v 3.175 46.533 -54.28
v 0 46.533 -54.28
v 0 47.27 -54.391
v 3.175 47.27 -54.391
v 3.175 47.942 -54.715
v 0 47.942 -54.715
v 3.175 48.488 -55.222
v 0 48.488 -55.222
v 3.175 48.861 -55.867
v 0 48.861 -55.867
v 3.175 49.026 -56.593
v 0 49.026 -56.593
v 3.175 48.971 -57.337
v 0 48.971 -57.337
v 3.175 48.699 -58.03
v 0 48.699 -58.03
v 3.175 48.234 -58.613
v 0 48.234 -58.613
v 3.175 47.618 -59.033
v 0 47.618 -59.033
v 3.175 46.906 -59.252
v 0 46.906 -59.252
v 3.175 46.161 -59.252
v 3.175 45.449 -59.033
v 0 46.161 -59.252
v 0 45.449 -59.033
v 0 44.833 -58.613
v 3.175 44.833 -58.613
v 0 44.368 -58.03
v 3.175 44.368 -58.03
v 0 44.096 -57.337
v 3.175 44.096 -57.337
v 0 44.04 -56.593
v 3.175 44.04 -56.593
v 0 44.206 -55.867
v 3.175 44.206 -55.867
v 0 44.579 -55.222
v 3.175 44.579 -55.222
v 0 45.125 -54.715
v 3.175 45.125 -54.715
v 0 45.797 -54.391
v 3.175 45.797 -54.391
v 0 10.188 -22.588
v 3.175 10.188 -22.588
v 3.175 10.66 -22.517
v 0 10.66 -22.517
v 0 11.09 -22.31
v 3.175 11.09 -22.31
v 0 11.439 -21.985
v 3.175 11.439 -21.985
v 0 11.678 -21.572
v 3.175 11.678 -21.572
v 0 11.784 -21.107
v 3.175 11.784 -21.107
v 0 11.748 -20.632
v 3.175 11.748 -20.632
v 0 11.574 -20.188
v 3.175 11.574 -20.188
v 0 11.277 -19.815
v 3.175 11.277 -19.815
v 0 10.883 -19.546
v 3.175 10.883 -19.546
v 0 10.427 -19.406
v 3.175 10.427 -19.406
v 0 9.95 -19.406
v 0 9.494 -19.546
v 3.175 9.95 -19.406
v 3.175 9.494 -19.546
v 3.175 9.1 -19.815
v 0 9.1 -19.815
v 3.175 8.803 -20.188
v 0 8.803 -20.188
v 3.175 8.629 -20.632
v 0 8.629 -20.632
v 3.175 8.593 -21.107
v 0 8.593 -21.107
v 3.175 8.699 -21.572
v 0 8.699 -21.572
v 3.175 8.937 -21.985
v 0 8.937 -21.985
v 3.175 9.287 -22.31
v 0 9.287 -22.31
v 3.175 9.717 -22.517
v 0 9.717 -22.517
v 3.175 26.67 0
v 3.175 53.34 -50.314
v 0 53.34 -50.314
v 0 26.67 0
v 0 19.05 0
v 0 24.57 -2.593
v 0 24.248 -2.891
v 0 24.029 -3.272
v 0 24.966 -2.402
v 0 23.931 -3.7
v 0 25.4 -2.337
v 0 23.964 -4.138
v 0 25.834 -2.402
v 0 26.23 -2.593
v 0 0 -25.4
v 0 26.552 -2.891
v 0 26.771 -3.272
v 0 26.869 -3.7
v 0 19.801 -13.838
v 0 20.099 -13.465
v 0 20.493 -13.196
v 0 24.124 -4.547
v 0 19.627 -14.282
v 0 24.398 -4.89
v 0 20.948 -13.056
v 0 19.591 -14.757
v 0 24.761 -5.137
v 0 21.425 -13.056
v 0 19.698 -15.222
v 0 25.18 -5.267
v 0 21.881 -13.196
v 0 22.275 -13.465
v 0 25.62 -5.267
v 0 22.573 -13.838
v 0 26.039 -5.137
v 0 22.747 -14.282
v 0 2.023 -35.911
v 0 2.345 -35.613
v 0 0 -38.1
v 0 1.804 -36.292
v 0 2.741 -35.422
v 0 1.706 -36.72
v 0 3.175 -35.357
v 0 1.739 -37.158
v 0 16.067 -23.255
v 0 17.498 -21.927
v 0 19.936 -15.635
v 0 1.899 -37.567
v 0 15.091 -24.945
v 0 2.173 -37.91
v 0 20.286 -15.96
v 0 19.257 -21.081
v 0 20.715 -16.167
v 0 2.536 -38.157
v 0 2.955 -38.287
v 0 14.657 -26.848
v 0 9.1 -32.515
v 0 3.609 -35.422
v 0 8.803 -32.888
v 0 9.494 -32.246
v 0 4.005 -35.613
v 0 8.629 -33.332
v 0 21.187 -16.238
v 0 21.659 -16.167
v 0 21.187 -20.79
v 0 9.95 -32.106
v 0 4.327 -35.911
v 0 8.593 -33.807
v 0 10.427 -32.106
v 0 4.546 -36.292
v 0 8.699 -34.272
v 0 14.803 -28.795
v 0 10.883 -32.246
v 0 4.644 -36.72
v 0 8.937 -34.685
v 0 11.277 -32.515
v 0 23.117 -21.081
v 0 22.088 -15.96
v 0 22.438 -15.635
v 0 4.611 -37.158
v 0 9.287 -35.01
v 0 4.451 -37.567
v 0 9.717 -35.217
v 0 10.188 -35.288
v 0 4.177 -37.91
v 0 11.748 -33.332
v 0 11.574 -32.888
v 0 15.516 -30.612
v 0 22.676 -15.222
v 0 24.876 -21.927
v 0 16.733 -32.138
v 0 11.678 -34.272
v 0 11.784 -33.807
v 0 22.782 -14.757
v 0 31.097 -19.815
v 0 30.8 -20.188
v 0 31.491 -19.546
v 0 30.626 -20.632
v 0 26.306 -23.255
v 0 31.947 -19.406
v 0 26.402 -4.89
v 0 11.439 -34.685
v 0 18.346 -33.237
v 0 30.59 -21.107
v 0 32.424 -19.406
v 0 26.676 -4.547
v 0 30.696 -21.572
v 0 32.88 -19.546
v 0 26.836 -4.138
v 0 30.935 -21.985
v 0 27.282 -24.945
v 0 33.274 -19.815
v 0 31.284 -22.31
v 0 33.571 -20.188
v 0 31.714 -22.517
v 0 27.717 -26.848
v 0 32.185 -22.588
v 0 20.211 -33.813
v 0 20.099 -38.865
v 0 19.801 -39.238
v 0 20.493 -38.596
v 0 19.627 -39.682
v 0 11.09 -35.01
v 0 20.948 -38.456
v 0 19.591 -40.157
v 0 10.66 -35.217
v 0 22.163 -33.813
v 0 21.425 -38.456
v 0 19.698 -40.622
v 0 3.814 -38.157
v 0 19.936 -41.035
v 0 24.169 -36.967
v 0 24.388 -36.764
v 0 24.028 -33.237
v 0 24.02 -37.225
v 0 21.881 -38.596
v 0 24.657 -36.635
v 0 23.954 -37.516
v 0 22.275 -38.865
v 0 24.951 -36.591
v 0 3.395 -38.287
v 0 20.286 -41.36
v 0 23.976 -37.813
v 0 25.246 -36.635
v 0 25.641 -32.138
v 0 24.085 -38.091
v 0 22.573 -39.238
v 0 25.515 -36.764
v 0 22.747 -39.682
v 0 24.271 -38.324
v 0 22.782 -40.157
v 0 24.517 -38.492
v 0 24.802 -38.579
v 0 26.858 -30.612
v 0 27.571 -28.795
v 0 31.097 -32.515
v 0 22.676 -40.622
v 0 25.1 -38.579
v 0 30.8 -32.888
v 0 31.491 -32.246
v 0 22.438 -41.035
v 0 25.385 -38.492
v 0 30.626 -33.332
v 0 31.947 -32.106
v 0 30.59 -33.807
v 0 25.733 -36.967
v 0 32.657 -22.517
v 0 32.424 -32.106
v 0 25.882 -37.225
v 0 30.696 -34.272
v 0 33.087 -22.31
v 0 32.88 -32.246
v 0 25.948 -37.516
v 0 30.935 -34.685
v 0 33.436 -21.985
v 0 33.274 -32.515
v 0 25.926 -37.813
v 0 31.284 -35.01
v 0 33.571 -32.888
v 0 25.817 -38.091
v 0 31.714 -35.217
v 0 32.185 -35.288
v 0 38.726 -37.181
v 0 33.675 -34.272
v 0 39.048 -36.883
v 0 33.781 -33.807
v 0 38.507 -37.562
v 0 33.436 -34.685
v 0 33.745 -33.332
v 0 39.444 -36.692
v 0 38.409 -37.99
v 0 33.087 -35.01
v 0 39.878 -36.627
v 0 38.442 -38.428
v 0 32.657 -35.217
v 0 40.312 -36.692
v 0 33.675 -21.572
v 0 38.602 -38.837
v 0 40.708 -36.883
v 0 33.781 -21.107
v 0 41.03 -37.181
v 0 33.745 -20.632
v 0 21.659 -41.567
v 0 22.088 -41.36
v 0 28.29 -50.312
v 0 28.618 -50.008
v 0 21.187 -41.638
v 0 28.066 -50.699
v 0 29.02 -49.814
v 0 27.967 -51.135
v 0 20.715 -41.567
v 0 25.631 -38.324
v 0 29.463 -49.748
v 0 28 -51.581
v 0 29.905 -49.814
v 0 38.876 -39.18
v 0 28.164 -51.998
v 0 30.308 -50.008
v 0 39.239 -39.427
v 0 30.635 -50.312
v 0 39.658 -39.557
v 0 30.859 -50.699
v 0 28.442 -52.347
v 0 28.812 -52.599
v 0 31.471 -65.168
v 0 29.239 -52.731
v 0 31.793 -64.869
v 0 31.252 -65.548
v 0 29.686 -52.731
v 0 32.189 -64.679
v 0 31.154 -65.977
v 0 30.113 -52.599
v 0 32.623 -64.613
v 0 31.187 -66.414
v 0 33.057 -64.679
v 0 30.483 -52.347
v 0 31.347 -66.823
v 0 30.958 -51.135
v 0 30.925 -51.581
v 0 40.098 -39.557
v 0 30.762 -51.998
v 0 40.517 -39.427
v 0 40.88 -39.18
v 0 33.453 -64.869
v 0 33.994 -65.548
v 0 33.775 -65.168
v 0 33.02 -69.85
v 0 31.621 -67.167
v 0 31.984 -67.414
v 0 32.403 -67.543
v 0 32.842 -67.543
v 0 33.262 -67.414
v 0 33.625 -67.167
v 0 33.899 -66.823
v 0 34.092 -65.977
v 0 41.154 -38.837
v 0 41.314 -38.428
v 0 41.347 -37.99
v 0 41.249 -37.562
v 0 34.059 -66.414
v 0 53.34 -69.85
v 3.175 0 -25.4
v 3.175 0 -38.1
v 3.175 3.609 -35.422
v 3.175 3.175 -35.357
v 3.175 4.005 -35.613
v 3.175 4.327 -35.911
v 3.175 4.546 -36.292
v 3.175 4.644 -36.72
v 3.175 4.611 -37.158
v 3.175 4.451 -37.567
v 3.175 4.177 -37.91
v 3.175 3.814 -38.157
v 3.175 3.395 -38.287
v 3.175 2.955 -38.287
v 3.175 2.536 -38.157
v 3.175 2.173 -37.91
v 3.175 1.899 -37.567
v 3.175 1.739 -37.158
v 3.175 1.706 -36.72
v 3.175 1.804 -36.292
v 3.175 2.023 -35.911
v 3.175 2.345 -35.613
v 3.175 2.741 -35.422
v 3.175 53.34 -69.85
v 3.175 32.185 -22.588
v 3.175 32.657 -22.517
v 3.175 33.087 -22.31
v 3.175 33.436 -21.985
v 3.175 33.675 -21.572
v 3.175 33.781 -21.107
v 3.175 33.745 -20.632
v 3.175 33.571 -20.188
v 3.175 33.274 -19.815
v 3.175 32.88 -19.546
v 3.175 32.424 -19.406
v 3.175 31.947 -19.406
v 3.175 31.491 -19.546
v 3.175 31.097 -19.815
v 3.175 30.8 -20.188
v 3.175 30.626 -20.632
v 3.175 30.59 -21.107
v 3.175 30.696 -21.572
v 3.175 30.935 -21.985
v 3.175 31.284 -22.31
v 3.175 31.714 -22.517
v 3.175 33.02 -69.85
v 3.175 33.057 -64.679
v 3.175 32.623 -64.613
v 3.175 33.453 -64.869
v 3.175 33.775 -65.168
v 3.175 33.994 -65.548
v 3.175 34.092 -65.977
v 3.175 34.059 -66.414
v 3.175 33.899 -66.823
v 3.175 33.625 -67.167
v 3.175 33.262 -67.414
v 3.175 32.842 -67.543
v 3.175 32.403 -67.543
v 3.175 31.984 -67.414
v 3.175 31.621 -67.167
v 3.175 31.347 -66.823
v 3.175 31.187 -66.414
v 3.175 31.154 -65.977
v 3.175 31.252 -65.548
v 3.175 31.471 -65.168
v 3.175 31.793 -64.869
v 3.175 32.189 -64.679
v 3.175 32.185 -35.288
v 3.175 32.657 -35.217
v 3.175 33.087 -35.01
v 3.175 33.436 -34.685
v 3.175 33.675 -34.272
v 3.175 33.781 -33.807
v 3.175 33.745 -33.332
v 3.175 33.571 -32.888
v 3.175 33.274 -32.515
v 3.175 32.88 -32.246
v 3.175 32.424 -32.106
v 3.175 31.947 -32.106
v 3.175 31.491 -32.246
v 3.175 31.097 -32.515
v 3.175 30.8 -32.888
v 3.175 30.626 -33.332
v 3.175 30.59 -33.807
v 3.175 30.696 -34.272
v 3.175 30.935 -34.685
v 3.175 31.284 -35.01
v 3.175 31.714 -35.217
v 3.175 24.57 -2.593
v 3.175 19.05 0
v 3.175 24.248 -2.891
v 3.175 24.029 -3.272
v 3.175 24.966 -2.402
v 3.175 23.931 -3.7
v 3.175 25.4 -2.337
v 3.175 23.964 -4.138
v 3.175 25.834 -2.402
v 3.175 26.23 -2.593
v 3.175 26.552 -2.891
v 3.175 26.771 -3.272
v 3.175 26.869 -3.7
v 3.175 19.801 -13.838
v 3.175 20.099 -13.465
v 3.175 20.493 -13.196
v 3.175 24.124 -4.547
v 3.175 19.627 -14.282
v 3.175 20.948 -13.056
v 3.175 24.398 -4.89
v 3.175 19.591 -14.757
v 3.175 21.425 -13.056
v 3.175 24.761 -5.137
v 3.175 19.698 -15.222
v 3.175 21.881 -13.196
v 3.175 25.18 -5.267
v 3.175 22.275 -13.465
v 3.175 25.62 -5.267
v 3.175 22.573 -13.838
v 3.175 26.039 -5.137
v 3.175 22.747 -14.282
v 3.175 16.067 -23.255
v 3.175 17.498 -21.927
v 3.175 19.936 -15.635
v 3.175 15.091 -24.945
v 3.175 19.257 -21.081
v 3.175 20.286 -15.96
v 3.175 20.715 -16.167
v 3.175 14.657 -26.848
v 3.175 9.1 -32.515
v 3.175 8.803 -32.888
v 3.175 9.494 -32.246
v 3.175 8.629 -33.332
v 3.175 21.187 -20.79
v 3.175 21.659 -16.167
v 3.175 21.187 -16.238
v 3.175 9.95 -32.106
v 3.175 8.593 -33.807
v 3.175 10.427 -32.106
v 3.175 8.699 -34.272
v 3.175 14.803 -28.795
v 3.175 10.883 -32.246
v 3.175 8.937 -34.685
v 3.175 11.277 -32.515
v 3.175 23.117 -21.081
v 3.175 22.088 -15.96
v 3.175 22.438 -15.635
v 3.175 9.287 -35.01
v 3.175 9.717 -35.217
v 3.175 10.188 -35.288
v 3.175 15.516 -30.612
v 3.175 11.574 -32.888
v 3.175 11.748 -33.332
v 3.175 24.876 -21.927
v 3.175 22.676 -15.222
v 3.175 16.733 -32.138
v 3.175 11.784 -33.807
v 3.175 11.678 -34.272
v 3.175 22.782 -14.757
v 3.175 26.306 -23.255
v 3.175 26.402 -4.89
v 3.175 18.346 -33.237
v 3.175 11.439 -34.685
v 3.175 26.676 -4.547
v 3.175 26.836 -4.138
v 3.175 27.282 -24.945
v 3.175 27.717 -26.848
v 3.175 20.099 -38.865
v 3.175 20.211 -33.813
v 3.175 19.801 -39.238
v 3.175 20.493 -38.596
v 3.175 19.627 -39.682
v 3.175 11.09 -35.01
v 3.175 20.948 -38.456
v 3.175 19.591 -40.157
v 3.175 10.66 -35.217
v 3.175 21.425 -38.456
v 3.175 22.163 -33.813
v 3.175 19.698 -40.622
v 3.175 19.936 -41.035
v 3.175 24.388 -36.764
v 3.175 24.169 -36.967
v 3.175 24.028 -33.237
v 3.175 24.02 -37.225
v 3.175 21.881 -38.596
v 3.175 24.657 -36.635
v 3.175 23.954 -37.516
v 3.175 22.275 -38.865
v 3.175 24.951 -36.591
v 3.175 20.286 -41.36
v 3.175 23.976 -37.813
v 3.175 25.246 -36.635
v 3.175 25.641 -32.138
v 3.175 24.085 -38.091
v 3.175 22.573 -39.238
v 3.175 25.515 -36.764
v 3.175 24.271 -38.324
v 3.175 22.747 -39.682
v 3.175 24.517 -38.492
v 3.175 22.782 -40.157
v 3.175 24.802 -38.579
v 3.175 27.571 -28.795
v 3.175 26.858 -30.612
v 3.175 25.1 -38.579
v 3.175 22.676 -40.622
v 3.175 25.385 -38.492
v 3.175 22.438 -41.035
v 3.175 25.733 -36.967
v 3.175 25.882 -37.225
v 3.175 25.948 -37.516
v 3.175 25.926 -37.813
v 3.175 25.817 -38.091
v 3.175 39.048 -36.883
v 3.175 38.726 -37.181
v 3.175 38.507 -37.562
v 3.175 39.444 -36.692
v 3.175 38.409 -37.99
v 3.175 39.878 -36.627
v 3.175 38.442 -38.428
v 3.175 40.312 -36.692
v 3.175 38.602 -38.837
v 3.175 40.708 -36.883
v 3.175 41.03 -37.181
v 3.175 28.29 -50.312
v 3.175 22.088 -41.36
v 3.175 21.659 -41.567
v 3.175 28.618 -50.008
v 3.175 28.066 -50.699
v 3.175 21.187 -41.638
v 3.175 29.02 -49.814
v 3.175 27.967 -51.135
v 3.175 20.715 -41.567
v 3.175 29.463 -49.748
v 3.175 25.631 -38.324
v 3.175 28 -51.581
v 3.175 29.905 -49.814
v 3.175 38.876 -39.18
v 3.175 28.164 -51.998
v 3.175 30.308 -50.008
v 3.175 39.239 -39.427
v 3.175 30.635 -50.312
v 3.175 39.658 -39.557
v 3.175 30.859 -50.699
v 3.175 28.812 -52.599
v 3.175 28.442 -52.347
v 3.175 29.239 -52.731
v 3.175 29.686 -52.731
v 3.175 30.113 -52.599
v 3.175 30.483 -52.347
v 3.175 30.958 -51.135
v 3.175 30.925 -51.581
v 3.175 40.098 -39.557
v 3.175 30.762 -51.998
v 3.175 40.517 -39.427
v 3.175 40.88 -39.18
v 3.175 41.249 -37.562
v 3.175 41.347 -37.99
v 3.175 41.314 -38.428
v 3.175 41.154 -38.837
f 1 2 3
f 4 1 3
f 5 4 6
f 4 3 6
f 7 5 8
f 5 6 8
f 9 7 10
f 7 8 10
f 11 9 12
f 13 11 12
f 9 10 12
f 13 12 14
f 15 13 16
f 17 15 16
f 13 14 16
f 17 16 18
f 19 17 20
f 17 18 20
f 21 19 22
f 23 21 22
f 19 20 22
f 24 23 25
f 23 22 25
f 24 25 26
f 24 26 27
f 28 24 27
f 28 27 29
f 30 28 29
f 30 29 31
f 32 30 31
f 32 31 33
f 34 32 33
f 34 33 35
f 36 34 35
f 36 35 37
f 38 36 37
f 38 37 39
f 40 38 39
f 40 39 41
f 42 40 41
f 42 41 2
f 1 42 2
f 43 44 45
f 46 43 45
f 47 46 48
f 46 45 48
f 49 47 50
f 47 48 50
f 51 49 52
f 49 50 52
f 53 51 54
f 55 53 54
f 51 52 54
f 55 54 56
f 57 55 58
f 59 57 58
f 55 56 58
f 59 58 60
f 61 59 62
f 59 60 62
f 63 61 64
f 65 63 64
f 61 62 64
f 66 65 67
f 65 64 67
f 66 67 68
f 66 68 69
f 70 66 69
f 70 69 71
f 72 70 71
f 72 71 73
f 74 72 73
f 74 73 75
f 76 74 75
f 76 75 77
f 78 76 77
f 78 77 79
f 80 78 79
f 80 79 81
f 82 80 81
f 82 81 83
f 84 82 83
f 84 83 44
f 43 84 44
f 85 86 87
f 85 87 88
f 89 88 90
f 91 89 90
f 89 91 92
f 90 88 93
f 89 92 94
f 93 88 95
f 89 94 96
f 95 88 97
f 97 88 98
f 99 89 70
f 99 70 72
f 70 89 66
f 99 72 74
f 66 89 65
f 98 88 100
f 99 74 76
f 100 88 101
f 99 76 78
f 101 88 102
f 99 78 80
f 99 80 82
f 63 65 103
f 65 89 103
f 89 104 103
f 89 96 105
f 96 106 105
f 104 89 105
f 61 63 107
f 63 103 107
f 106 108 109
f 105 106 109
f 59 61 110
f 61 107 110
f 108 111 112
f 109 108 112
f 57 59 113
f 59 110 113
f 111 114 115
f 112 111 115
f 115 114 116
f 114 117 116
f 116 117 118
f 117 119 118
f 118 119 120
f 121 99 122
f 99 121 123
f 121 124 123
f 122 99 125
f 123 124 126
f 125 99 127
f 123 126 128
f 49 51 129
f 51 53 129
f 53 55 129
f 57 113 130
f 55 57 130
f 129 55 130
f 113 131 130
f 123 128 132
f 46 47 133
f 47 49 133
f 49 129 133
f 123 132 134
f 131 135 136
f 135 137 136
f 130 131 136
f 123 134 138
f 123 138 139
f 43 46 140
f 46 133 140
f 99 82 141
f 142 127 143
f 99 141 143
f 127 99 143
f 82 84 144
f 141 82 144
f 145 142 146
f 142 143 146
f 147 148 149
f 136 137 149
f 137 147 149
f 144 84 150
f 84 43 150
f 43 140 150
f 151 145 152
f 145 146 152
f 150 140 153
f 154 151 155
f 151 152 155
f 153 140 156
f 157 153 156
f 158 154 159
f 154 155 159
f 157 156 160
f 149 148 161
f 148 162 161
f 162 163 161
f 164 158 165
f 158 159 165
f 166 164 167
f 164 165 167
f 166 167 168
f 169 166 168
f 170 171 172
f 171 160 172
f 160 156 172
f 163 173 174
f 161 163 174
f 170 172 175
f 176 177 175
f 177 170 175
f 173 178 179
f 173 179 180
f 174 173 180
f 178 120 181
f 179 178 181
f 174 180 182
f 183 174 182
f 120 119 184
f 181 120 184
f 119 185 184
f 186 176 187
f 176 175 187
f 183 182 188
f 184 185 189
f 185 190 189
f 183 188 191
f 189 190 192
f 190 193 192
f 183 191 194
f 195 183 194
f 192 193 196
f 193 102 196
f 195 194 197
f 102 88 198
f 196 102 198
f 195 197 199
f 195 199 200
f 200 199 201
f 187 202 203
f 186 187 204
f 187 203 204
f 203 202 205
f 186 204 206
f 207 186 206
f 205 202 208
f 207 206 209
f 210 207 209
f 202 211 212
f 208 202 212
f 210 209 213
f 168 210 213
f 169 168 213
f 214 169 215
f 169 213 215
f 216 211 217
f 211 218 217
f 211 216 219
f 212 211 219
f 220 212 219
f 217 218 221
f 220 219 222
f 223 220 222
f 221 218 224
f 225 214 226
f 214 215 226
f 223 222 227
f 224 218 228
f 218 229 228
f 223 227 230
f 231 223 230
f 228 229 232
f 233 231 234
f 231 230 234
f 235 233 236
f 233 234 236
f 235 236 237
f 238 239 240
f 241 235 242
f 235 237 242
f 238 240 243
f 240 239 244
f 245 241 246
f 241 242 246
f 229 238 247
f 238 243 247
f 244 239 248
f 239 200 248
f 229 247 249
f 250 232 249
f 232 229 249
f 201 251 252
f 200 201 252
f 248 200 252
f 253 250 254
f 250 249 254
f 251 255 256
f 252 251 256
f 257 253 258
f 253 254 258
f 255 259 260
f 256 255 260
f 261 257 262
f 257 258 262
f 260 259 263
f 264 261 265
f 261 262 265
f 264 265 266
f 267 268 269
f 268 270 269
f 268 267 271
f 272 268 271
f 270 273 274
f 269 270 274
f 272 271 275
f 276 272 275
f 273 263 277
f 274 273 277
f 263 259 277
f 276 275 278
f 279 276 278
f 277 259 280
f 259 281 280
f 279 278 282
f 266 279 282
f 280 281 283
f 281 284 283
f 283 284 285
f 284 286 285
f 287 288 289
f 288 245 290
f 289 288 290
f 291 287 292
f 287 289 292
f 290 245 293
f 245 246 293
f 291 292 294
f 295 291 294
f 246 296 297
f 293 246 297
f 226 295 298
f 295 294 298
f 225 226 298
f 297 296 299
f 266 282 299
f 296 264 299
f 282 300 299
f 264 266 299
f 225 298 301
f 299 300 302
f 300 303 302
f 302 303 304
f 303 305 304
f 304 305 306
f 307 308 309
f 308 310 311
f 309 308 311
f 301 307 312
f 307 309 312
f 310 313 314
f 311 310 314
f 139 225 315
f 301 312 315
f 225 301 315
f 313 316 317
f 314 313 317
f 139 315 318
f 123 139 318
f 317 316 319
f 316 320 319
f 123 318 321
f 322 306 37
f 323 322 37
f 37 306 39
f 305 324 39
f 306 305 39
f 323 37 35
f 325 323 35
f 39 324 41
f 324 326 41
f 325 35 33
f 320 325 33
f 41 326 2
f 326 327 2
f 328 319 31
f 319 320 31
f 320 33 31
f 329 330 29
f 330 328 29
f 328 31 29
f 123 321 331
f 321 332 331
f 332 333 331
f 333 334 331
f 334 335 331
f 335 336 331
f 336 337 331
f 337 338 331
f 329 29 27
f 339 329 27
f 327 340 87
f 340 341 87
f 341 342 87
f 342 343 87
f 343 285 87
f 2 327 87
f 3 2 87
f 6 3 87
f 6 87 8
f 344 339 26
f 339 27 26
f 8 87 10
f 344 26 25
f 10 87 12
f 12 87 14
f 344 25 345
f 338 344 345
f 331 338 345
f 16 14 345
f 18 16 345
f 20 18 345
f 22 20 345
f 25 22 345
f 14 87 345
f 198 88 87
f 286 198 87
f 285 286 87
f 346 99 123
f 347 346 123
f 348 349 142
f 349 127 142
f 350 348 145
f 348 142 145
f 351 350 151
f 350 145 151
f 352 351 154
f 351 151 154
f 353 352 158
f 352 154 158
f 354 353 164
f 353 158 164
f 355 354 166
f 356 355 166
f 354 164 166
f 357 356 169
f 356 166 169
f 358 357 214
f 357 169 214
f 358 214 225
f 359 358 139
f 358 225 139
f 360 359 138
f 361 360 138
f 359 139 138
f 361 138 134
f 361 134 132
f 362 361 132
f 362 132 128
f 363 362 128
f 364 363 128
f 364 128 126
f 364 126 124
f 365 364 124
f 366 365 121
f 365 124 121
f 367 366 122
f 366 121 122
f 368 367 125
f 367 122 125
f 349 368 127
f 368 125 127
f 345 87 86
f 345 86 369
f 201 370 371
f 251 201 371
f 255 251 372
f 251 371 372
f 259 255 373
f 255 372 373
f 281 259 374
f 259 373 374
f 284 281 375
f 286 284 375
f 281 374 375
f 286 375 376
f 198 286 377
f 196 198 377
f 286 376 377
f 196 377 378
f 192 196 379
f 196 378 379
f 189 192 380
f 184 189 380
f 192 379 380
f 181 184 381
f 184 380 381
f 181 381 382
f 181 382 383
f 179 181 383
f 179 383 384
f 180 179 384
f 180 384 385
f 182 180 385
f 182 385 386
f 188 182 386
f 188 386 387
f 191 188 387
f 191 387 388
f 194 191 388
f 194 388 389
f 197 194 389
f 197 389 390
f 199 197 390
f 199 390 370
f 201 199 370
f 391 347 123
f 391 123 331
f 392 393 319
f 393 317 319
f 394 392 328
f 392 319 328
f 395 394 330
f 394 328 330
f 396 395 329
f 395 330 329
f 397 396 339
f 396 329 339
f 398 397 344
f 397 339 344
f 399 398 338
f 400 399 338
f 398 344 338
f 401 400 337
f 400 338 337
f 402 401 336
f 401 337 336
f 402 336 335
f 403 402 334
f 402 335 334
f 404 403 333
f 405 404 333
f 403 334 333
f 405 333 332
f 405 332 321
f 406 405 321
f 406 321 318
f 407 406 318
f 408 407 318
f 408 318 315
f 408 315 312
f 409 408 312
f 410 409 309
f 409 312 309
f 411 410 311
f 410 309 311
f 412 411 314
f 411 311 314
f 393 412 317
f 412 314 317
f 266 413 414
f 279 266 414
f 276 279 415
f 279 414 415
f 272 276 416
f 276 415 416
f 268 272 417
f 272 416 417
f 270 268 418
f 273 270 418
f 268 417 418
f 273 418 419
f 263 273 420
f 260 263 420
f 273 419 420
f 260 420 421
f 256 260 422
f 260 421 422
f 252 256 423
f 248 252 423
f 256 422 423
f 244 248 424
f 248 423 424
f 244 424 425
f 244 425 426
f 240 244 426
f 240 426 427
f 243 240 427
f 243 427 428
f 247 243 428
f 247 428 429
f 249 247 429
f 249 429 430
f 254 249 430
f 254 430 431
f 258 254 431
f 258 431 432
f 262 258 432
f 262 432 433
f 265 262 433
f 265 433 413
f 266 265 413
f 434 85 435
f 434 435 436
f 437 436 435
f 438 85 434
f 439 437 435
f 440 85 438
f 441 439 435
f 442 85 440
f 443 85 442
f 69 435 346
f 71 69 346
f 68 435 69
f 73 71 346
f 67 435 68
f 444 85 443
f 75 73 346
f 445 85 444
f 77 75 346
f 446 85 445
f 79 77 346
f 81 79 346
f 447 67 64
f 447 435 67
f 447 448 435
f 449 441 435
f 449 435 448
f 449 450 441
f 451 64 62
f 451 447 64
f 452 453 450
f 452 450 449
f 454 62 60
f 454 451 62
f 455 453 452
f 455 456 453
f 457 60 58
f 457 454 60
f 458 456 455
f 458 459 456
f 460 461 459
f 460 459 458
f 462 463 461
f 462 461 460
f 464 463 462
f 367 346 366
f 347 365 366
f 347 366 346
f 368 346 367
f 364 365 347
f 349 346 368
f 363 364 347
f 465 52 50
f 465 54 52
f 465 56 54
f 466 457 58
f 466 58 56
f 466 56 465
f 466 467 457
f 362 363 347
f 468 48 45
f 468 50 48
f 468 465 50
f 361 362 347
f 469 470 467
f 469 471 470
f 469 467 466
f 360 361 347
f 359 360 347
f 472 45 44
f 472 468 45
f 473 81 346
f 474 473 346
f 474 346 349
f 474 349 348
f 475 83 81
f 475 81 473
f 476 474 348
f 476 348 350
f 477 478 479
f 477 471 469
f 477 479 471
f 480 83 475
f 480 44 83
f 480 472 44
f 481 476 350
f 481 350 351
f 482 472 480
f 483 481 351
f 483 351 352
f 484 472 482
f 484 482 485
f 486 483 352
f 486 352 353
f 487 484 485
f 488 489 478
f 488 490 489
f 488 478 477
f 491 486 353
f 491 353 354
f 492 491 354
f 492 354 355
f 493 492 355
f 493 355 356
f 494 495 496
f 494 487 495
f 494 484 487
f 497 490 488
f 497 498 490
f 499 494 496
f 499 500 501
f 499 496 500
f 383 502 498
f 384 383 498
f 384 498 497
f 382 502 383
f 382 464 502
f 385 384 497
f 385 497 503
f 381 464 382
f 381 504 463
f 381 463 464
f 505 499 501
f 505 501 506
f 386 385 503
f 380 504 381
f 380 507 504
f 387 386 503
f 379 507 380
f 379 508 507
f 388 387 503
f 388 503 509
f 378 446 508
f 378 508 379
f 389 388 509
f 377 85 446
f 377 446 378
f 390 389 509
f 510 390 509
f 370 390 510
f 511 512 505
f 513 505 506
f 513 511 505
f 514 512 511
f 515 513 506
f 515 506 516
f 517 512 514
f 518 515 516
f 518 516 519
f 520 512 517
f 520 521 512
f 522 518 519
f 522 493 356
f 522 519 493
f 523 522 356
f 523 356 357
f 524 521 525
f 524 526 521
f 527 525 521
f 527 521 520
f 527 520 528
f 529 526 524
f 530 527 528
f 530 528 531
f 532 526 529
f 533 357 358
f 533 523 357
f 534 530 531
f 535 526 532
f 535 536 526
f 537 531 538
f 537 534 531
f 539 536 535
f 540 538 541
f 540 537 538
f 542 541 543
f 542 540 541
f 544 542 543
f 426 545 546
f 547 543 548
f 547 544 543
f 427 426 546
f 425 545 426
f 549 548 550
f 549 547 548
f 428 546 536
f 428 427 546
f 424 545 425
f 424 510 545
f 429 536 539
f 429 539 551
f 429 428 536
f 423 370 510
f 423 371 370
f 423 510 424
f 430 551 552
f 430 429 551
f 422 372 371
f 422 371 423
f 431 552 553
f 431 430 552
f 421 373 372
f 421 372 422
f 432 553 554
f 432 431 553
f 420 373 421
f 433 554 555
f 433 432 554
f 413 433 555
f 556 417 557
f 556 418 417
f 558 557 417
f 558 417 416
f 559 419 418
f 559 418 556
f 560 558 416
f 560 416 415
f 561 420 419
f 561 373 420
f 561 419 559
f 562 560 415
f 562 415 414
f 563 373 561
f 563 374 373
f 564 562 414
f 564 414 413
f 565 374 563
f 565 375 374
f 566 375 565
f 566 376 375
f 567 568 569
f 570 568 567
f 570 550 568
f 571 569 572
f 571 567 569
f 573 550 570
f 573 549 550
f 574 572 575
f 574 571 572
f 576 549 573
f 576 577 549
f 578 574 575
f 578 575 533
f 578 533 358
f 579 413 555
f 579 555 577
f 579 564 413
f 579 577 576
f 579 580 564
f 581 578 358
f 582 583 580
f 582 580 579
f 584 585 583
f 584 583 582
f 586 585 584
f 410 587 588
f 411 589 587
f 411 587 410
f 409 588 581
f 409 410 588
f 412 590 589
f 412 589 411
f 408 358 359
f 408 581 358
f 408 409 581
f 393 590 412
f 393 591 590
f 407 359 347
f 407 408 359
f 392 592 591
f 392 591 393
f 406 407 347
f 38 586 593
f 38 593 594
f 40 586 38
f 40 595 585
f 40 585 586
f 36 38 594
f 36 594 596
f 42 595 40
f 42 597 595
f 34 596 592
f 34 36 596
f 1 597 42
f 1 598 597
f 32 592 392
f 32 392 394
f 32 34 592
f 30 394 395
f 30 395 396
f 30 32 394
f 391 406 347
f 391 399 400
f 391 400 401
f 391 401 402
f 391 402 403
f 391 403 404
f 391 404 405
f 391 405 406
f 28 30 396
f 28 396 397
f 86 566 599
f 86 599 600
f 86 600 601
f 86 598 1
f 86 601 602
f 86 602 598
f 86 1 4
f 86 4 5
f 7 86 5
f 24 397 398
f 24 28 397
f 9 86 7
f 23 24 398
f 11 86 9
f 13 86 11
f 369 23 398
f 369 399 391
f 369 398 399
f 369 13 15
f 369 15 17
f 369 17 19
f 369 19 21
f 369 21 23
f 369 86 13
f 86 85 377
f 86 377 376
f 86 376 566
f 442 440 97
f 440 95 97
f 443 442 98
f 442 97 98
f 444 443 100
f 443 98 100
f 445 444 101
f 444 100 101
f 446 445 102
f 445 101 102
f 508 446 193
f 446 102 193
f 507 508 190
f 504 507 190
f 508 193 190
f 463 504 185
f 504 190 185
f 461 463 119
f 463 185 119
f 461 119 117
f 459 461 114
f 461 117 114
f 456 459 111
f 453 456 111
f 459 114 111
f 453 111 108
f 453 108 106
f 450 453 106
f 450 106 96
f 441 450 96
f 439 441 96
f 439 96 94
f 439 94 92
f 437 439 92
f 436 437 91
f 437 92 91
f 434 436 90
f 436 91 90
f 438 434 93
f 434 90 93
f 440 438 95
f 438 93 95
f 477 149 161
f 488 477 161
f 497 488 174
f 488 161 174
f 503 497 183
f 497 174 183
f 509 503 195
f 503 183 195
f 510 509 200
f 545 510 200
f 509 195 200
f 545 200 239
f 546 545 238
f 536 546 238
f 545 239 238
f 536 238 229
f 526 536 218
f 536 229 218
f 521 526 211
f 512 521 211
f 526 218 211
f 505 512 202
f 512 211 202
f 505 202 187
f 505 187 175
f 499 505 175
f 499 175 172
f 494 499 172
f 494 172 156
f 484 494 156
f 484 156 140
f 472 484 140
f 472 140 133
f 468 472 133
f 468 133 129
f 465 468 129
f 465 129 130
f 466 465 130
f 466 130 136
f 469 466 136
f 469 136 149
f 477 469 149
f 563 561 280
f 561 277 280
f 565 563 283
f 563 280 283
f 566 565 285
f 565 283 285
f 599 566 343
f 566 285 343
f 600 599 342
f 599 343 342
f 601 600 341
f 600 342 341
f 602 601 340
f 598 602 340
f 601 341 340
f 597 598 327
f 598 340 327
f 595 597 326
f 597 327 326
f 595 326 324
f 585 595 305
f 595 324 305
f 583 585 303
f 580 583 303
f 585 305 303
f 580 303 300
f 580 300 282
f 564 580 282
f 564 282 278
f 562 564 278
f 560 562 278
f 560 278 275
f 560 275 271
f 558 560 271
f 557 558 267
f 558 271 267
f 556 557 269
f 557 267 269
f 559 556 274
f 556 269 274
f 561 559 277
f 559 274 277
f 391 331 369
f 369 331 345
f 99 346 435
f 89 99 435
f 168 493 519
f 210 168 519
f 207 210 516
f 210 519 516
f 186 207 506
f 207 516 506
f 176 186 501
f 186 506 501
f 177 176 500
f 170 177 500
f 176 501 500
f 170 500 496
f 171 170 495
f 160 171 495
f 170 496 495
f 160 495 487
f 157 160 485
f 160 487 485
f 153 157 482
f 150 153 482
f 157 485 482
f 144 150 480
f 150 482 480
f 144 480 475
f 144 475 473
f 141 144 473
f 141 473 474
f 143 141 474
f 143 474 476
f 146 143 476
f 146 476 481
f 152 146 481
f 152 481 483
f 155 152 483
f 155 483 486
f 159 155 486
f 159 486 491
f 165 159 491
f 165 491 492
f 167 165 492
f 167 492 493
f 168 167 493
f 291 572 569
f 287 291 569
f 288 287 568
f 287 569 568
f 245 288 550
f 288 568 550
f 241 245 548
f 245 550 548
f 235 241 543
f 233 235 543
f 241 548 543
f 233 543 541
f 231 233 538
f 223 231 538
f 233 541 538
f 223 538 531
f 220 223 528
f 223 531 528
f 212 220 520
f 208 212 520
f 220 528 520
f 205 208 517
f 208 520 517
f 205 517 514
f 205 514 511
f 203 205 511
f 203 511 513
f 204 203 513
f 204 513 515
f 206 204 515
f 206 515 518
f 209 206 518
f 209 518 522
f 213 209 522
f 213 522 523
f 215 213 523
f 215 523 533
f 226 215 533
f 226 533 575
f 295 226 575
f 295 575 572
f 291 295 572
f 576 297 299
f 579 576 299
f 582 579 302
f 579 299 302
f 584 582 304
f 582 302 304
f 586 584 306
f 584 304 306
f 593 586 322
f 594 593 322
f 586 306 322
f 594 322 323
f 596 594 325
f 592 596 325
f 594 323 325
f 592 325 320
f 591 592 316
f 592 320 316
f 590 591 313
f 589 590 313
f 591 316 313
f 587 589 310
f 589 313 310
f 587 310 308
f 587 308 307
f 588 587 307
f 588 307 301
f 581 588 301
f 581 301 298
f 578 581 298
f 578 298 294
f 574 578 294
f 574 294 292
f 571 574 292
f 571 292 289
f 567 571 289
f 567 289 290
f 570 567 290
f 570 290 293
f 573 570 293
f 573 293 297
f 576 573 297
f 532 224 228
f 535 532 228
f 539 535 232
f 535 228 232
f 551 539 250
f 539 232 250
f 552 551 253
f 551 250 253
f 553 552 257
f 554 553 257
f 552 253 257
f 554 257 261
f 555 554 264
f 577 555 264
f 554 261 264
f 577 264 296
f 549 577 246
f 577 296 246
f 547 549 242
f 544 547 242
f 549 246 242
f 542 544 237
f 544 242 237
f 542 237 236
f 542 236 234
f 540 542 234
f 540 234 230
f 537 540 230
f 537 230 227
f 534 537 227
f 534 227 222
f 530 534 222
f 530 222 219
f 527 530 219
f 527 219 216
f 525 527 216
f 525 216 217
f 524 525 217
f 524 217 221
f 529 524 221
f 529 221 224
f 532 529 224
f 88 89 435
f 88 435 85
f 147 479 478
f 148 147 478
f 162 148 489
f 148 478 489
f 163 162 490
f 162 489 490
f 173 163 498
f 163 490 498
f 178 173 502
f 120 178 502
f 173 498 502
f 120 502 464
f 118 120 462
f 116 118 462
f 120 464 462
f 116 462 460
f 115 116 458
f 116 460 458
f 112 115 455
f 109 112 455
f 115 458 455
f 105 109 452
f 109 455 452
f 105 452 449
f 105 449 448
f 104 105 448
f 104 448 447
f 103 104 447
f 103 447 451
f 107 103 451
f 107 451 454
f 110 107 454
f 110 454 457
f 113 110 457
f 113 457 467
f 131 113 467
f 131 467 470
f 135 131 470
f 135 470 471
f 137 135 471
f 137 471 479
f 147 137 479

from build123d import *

# Parameters (mm, degrees)
SKETCH1_W                           = 69.85
SKETCH1_H                           = 53.34
BOSS_EXTRUDE1_DEPTH                 = 3.175
F_1_2_CLEARANCE_HOLE1_D             = 13.09624
F_1_2_CLEARANCE_HOLE1_DEPTH         = 25.4
F_1_2_CLEARANCE_HOLE1_TIP           = 3.934507437
M3_CLEARANCE_HOLE1_D                = 3.2
M3_CLEARANCE_HOLE1_DEPTH            = 25.4
M3_CLEARANCE_HOLE1_TIP              = 0.96137699
F_2_0MM_CLEARANCE_DOWEL_HOLE1_D     = 2
F_2_0MM_CLEARANCE_DOWEL_HOLE1_DEPTH = 25.4
F_2_0MM_CLEARANCE_DOWEL_HOLE1_TIP   = 0.600860619
F_3_0MM_CLEARANCE_DOWEL_HOLE1_D     = 3
F_3_0MM_CLEARANCE_DOWEL_HOLE1_DEPTH = 25.4
F_3_0MM_CLEARANCE_DOWEL_HOLE1_TIP   = 0.901290929
F_5_0MM_CLEARANCE_DOWEL_HOLE1_D     = 5
F_5_0MM_CLEARANCE_DOWEL_HOLE1_DEPTH = 25.4
F_5_0MM_CLEARANCE_DOWEL_HOLE1_TIP   = 1.502151548
CUT_EXTRUDE1_DEPTH                  = 88.94463443
F_4_CLEARANCE_HOLE1_D               = 2.9464
F_4_CLEARANCE_HOLE1_DEPTH           = 3.175
F_4_CLEARANCE_HOLE1_TIP             = 0.885187864


with BuildPart() as part:
    # Sketch1 → Boss-Extrude1 (new body)
    with BuildSketch(Plane(origin=(0, 0, 0), x_dir=(0, 0, -1), z_dir=(1, 0, 0))):
        with Locations((34.925, 26.67)):
            Rectangle(SKETCH1_W, SKETCH1_H)
    extrude(amount=BOSS_EXTRUDE1_DEPTH)

    # 1/2 Clearance Hole1
    with Locations(Plane(origin=(3.175, 0, 0), x_dir=(0, 0, -1), z_dir=(1, 0, 0))):
        with Locations((27.33778886, 21.18693756)):
            Hole(F_1_2_CLEARANCE_HOLE1_D / 2, depth=F_1_2_CLEARANCE_HOLE1_DEPTH)
            with Locations((0, 0, -(F_1_2_CLEARANCE_HOLE1_DEPTH + F_1_2_CLEARANCE_HOLE1_TIP / 2))):  # 118° drill point
                Cone(0, F_1_2_CLEARANCE_HOLE1_D / 2, F_1_2_CLEARANCE_HOLE1_TIP, mode=Mode.SUBTRACT)

    # M3 Clearance Hole1
    with Locations(Plane.ZY):
        with Locations((-40.03778886, 21.18693756), (-33.68778886, 32.185460188), (-20.98778886, 32.185460188), (-14.63778886, 21.18693756), (-20.98778886, 10.188414932), (-33.68778886, 10.188414932), (-27.33778886, 21.18693756)):
            Hole(M3_CLEARANCE_HOLE1_D / 2, depth=M3_CLEARANCE_HOLE1_DEPTH)
            with Locations((0, 0, -(M3_CLEARANCE_HOLE1_DEPTH + M3_CLEARANCE_HOLE1_TIP / 2))):  # 118° drill point
                Cone(0, M3_CLEARANCE_HOLE1_D / 2, M3_CLEARANCE_HOLE1_TIP, mode=Mode.SUBTRACT)

    # Ø2.0mm Clearance Dowel Hole1
    with Locations(Plane(origin=(3.175, 0, 0), x_dir=(0, 0, -1), z_dir=(1, 0, 0))):
        with Locations((37.59058776, 24.95127344)):
            Hole(F_2_0MM_CLEARANCE_DOWEL_HOLE1_D / 2, depth=F_2_0MM_CLEARANCE_DOWEL_HOLE1_DEPTH)
            with Locations((0, 0, -(F_2_0MM_CLEARANCE_DOWEL_HOLE1_DEPTH + F_2_0MM_CLEARANCE_DOWEL_HOLE1_TIP / 2))):  # 118° drill point
                Cone(0, F_2_0MM_CLEARANCE_DOWEL_HOLE1_D / 2, F_2_0MM_CLEARANCE_DOWEL_HOLE1_TIP, mode=Mode.SUBTRACT)

    # Ø3.0mm Clearance Dowel Hole1
    with Locations(Plane(origin=(3.175, 0, 0), x_dir=(0, 0, -1), z_dir=(1, 0, 0))):
        with Locations((51.24750482, 29.46260554)):
            Hole(F_3_0MM_CLEARANCE_DOWEL_HOLE1_D / 2, depth=F_3_0MM_CLEARANCE_DOWEL_HOLE1_DEPTH)
            with Locations((0, 0, -(F_3_0MM_CLEARANCE_DOWEL_HOLE1_DEPTH + F_3_0MM_CLEARANCE_DOWEL_HOLE1_TIP / 2))):  # 118° drill point
                Cone(0, F_3_0MM_CLEARANCE_DOWEL_HOLE1_D / 2, F_3_0MM_CLEARANCE_DOWEL_HOLE1_TIP, mode=Mode.SUBTRACT)

    # Ø5.0mm Clearance Dowel Hole1
    with Locations(Plane(origin=(3.175, 0, 0), x_dir=(0, 0, -1), z_dir=(1, 0, 0))):
        with Locations((56.78027506, 46.53348834)):
            Hole(F_5_0MM_CLEARANCE_DOWEL_HOLE1_D / 2, depth=F_5_0MM_CLEARANCE_DOWEL_HOLE1_DEPTH)
            with Locations((0, 0, -(F_5_0MM_CLEARANCE_DOWEL_HOLE1_DEPTH + F_5_0MM_CLEARANCE_DOWEL_HOLE1_TIP / 2))):  # 118° drill point
                Cone(0, F_5_0MM_CLEARANCE_DOWEL_HOLE1_D / 2, F_5_0MM_CLEARANCE_DOWEL_HOLE1_TIP, mode=Mode.SUBTRACT)

    # Sketch12 → Cut-Extrude1 (cut, through all)
    with BuildSketch(Plane(origin=(3.175, 0, 0), x_dir=(0, 0, -1), z_dir=(1, 0, 0))):
        Polygon((0, 53.34), (50.313533093, 53.34), (0, 26.67), align=None)
        Polygon((69.85, 0), (38.1, 0), (69.85, 33.02), align=None)
        Polygon((25.4, 0), (0, 19.05), (0, 0), align=None)
    extrude(amount=-CUT_EXTRUDE1_DEPTH, mode=Mode.SUBTRACT)

    # #4 Clearance Hole1
    with Locations(Plane(origin=(3.175, 0, 0), x_dir=(0, 0, -1), z_dir=(1, 0, 0))):
        with Locations((3.81, 25.4), (36.83, 3.175), (66.08666234, 32.62292688), (38.1, 39.878)):
            Hole(F_4_CLEARANCE_HOLE1_D / 2, depth=F_4_CLEARANCE_HOLE1_DEPTH)
            with Locations((0, 0, -(F_4_CLEARANCE_HOLE1_DEPTH + F_4_CLEARANCE_HOLE1_TIP / 2))):  # 118° drill point
                Cone(0, F_4_CLEARANCE_HOLE1_D / 2, F_4_CLEARANCE_HOLE1_TIP, mode=Mode.SUBTRACT)


solid = part.part
